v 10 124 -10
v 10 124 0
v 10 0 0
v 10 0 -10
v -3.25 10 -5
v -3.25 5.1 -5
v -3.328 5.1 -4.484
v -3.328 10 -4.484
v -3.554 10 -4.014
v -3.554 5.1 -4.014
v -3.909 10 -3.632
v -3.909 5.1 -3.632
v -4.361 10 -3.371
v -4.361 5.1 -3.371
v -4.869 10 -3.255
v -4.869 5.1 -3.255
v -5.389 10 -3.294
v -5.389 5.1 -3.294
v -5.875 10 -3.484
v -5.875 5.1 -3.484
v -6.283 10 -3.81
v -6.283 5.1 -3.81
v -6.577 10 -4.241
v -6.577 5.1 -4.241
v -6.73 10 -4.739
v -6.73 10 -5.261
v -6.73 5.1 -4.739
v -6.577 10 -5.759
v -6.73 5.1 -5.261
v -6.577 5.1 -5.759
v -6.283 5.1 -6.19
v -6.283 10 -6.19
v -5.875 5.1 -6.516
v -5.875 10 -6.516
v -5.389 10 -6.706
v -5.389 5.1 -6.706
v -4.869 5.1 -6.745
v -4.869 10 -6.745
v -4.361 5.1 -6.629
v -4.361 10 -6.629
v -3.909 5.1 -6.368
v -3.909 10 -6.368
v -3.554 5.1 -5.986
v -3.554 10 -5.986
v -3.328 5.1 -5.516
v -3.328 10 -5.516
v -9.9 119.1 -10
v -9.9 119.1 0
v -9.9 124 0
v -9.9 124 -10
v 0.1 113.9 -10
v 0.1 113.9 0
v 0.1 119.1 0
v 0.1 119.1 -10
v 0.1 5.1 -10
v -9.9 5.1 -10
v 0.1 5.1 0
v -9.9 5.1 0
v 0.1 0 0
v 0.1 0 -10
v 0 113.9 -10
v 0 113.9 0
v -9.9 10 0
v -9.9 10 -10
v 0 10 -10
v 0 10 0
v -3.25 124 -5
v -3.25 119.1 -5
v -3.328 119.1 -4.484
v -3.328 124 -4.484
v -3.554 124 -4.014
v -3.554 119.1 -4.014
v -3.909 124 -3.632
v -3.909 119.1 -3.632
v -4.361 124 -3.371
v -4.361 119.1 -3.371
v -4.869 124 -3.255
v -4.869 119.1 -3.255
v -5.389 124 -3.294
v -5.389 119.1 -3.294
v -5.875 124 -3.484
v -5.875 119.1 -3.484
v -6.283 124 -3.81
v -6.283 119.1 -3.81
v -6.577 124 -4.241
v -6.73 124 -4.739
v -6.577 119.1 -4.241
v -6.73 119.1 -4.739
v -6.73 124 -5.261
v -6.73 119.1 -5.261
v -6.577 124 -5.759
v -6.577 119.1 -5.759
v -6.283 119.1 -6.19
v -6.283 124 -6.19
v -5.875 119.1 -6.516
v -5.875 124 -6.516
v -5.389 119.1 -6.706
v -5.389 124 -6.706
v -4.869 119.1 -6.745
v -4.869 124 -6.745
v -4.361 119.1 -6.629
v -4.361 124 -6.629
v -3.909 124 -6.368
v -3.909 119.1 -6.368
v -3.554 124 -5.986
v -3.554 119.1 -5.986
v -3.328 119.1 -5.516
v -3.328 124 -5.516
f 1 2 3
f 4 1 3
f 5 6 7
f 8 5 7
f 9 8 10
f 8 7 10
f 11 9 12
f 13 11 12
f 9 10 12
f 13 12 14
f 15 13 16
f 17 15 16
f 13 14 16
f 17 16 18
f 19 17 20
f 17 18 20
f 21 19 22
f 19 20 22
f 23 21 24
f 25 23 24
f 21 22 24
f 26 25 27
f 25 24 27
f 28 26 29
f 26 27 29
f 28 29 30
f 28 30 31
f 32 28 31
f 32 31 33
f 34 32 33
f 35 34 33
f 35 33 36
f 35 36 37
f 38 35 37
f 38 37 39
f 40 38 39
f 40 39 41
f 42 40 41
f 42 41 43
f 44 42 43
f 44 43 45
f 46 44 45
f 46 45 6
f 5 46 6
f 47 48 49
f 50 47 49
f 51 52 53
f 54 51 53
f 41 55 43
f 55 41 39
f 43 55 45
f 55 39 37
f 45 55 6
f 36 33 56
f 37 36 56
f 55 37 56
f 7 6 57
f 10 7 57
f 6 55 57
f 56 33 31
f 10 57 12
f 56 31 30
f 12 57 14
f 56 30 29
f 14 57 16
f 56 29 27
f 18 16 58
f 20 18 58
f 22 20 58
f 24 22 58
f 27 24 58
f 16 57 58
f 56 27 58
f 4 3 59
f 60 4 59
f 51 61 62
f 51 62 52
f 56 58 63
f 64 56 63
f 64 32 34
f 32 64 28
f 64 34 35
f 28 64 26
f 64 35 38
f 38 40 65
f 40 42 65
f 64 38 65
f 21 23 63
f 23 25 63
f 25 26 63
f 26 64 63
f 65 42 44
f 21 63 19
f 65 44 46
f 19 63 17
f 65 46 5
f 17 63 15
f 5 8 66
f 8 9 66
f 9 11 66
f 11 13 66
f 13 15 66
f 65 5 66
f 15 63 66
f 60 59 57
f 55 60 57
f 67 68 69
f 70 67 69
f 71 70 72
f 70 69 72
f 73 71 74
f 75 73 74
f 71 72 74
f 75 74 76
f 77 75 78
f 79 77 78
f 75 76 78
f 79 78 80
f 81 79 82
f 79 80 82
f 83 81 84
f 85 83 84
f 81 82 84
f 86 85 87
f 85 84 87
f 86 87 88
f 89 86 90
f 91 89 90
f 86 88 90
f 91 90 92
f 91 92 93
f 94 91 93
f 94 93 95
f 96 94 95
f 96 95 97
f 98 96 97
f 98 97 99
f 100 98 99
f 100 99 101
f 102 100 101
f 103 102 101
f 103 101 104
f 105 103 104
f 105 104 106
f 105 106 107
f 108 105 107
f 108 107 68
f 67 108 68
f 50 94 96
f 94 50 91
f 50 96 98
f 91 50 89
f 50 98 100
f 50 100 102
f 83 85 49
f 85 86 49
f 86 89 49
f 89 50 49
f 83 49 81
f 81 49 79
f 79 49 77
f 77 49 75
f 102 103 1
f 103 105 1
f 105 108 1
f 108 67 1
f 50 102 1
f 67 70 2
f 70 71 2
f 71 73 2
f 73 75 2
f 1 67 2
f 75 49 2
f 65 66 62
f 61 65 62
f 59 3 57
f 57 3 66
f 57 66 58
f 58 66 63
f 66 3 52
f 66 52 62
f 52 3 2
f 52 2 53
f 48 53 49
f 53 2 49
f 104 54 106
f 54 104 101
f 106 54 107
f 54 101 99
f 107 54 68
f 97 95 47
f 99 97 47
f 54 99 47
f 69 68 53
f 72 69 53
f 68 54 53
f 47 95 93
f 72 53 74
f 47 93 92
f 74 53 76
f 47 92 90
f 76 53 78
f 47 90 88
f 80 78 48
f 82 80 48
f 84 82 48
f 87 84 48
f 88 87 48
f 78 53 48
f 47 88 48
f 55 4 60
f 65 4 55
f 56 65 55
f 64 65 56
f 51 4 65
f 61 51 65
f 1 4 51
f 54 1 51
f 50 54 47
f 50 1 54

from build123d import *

# Parameters (mm, degrees)
BOSS_EXTRUDE1_DEPTH = 10
CUT_EXTRUDE1_DEPTH  = 11
SKETCH3_R           = 1.75
CUT_EXTRUDE2_DEPTH  = 119.9


with BuildPart() as part:
    # Sketch1 → Boss-Extrude1 (new body)
    with BuildSketch(Plane.XY):
        Polygon((0, 0), (0, 5), (-10, 5), (-10, 10), (0, 10), (0, 119), (-10, 119), (-10, 124), (10, 124), (10, 0), align=None)
    extrude(amount=-BOSS_EXTRUDE1_DEPTH)

    # Sketch2 → Cut-Extrude1 (cut, through all)
    with BuildSketch(Plane.XY):
        Polygon((-10, 10), (-10, 5), (0, 5), (0, 0), (0.1, 0), (0.1, 5.1), (-9.9, 5.1), (-9.9, 10), align=None)
        Polygon((-10, 124), (-10, 119), (0, 119), (0, 113.9), (0.1, 113.9), (0.1, 119.1), (-9.9, 119.1), (-9.9, 124), align=None)
    extrude(amount=-CUT_EXTRUDE1_DEPTH, mode=Mode.SUBTRACT)

    # Sketch3 → Cut-Extrude2 (cut, through all)
    with BuildSketch(Plane.XZ.offset(-5.1)):
        with Locations((-5, -5)):
            Circle(SKETCH3_R)
    extrude(amount=-CUT_EXTRUDE2_DEPTH, mode=Mode.SUBTRACT)


solid = part.part
